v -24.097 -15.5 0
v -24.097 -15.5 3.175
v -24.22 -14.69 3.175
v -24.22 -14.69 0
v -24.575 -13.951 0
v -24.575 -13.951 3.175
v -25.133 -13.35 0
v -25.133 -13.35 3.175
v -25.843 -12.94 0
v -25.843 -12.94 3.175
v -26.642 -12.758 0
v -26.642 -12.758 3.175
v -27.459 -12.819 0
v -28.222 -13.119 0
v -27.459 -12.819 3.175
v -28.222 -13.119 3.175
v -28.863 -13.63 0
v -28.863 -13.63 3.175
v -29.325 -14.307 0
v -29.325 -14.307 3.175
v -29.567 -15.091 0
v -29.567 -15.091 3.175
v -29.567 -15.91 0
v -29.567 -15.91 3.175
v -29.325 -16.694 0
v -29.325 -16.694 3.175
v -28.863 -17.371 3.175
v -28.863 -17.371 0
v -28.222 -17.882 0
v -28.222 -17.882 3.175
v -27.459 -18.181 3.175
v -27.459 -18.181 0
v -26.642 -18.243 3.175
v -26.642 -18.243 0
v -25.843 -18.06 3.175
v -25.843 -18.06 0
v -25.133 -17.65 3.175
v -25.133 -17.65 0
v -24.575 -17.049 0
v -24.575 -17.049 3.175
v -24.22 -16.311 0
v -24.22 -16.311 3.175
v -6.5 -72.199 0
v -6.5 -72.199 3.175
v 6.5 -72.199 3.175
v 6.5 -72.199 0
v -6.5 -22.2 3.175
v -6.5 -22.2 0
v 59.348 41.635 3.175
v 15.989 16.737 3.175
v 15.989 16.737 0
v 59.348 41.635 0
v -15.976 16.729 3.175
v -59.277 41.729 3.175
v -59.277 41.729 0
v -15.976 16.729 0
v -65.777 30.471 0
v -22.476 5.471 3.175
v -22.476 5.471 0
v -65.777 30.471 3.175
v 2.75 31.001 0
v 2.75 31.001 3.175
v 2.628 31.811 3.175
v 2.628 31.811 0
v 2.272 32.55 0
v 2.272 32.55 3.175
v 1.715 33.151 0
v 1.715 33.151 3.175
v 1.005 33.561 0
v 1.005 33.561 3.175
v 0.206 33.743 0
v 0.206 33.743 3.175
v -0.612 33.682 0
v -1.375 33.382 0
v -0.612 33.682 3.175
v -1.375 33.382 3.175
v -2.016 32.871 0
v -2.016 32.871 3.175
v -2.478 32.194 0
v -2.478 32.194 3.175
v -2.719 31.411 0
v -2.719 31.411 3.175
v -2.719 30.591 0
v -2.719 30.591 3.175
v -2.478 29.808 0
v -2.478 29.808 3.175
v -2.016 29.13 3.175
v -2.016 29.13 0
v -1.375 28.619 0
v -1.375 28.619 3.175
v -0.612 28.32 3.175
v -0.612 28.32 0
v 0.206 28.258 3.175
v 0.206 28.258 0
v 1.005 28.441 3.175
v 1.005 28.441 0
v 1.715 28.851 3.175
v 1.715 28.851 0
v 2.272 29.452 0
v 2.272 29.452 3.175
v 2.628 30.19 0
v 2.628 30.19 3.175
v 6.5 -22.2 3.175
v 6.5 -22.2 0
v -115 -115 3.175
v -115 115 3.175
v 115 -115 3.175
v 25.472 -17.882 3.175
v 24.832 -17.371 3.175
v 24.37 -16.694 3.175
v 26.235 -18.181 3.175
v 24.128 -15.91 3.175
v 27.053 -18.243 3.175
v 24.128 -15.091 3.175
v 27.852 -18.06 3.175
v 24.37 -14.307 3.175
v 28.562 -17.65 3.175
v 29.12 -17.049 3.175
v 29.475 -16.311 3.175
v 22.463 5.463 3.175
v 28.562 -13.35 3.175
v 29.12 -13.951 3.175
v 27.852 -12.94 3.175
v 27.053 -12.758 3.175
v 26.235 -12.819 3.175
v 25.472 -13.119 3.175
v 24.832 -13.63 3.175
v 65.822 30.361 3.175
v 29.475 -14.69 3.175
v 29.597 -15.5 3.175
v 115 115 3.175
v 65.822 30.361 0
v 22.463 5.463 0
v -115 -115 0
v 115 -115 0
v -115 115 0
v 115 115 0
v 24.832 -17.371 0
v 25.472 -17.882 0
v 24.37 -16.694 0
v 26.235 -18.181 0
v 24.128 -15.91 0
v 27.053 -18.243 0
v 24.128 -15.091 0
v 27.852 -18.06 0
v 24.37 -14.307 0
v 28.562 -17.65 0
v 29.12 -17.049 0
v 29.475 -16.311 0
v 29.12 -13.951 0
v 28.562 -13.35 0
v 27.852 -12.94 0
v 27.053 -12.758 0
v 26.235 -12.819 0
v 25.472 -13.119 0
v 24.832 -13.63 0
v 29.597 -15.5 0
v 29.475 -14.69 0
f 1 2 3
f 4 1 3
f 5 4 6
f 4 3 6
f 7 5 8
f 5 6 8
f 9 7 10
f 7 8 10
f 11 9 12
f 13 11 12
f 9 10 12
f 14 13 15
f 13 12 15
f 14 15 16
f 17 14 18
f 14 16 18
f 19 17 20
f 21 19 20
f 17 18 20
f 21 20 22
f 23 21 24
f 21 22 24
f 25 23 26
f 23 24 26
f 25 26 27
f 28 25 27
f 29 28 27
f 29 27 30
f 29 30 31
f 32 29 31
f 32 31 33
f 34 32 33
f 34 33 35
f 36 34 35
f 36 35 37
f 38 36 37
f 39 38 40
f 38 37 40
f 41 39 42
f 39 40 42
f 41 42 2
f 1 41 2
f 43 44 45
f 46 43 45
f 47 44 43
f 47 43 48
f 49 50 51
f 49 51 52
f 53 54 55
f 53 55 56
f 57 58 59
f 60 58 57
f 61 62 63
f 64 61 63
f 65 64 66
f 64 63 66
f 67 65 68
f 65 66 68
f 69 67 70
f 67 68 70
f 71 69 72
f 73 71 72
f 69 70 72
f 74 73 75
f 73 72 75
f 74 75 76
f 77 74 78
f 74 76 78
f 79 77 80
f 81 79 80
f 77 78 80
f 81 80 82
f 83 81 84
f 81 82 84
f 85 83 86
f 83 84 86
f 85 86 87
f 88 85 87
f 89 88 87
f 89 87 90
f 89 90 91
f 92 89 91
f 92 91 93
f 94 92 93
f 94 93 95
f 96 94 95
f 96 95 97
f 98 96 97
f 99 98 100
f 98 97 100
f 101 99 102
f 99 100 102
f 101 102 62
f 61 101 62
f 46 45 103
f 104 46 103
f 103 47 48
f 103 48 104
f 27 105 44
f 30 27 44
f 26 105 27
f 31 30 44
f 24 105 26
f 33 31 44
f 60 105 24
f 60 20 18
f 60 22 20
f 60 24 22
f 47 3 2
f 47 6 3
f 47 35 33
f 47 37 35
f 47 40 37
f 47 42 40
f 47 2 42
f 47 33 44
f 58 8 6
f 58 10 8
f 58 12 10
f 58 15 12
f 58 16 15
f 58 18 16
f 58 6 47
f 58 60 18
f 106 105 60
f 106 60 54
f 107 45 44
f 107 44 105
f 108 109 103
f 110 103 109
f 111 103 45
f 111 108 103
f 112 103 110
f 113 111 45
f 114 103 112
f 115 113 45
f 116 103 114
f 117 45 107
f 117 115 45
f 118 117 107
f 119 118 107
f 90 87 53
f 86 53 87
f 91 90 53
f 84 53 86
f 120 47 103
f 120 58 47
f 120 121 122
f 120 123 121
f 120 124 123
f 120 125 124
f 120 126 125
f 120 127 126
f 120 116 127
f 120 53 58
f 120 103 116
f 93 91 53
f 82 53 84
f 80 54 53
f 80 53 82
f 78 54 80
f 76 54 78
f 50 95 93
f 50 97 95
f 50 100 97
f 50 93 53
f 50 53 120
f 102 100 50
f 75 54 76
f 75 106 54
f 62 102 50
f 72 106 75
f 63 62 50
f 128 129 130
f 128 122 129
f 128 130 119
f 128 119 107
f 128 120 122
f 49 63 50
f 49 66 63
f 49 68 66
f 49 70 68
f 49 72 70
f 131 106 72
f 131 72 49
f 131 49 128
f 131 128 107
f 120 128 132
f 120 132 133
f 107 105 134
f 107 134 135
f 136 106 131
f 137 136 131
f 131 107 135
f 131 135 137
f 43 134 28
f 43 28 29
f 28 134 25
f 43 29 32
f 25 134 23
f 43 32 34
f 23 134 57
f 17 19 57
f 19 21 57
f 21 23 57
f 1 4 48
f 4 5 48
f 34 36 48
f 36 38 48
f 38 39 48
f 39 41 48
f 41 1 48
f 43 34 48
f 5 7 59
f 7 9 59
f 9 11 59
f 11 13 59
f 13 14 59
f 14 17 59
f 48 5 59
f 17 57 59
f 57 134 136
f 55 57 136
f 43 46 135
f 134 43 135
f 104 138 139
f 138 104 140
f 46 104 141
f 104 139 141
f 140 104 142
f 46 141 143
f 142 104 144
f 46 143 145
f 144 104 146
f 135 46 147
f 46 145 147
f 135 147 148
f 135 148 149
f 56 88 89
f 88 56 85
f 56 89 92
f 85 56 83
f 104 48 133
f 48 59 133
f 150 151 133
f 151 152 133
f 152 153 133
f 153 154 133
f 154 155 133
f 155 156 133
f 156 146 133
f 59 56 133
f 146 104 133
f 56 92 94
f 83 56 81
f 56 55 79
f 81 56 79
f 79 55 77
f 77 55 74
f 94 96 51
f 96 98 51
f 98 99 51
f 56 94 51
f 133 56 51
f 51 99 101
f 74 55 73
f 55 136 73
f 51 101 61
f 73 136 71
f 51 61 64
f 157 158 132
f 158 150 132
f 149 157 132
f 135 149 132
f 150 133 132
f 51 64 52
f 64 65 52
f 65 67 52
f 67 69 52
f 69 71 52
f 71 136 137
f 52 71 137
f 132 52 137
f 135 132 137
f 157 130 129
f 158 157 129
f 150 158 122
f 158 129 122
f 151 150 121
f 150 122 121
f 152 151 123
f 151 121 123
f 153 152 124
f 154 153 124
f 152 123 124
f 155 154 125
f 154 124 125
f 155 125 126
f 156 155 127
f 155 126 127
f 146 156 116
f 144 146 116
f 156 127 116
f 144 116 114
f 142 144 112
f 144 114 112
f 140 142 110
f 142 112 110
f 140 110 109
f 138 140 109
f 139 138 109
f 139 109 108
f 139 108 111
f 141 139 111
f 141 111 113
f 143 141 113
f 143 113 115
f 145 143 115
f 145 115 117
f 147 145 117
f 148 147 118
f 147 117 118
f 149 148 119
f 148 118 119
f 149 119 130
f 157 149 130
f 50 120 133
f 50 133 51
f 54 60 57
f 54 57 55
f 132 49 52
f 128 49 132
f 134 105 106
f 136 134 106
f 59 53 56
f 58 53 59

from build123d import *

# Parameters (mm, degrees)
SKETCH1_W           = 230
SKETCH1_H           = 230
SKETCH1_R           = 2.75
SKETCH1_W_2         = 13
SKETCH1_H_2         = 49.999466707
BOSS_EXTRUDE1_DEPTH = 3.175


with BuildPart() as part:
    # Sketch1 → Boss-Extrude1 (new body)
    with BuildSketch(Plane.XY.offset(3.175)):
        Rectangle(SKETCH1_W, SKETCH1_H)
        with Locations((-26.847424973, -15.500368035)):
            Circle(SKETCH1_R, mode=Mode.SUBTRACT)
        with Locations((26.847424973, -15.500368035)):
            Circle(SKETCH1_R, mode=Mode.SUBTRACT)
        with Locations((0, 31.00073607)):
            Circle(SKETCH1_R, mode=Mode.SUBTRACT)
        with Locations((0, -47.199733354)):
            Rectangle(SKETCH1_W_2, SKETCH1_H_2, mode=Mode.SUBTRACT)
        Polygon((15.988970715, 16.736769417), (59.348272994, 41.634913462), (65.821859492, 30.361374627), (22.462557213, 5.463230583), align=None, mode=Mode.SUBTRACT)
        Polygon((-65.776572308, 30.470568229), (-59.276572308, 41.728898478), (-15.975763964, 16.729165125), (-22.475763964, 5.470834875), align=None, mode=Mode.SUBTRACT)
    extrude(amount=-BOSS_EXTRUDE1_DEPTH)


solid = part.part
